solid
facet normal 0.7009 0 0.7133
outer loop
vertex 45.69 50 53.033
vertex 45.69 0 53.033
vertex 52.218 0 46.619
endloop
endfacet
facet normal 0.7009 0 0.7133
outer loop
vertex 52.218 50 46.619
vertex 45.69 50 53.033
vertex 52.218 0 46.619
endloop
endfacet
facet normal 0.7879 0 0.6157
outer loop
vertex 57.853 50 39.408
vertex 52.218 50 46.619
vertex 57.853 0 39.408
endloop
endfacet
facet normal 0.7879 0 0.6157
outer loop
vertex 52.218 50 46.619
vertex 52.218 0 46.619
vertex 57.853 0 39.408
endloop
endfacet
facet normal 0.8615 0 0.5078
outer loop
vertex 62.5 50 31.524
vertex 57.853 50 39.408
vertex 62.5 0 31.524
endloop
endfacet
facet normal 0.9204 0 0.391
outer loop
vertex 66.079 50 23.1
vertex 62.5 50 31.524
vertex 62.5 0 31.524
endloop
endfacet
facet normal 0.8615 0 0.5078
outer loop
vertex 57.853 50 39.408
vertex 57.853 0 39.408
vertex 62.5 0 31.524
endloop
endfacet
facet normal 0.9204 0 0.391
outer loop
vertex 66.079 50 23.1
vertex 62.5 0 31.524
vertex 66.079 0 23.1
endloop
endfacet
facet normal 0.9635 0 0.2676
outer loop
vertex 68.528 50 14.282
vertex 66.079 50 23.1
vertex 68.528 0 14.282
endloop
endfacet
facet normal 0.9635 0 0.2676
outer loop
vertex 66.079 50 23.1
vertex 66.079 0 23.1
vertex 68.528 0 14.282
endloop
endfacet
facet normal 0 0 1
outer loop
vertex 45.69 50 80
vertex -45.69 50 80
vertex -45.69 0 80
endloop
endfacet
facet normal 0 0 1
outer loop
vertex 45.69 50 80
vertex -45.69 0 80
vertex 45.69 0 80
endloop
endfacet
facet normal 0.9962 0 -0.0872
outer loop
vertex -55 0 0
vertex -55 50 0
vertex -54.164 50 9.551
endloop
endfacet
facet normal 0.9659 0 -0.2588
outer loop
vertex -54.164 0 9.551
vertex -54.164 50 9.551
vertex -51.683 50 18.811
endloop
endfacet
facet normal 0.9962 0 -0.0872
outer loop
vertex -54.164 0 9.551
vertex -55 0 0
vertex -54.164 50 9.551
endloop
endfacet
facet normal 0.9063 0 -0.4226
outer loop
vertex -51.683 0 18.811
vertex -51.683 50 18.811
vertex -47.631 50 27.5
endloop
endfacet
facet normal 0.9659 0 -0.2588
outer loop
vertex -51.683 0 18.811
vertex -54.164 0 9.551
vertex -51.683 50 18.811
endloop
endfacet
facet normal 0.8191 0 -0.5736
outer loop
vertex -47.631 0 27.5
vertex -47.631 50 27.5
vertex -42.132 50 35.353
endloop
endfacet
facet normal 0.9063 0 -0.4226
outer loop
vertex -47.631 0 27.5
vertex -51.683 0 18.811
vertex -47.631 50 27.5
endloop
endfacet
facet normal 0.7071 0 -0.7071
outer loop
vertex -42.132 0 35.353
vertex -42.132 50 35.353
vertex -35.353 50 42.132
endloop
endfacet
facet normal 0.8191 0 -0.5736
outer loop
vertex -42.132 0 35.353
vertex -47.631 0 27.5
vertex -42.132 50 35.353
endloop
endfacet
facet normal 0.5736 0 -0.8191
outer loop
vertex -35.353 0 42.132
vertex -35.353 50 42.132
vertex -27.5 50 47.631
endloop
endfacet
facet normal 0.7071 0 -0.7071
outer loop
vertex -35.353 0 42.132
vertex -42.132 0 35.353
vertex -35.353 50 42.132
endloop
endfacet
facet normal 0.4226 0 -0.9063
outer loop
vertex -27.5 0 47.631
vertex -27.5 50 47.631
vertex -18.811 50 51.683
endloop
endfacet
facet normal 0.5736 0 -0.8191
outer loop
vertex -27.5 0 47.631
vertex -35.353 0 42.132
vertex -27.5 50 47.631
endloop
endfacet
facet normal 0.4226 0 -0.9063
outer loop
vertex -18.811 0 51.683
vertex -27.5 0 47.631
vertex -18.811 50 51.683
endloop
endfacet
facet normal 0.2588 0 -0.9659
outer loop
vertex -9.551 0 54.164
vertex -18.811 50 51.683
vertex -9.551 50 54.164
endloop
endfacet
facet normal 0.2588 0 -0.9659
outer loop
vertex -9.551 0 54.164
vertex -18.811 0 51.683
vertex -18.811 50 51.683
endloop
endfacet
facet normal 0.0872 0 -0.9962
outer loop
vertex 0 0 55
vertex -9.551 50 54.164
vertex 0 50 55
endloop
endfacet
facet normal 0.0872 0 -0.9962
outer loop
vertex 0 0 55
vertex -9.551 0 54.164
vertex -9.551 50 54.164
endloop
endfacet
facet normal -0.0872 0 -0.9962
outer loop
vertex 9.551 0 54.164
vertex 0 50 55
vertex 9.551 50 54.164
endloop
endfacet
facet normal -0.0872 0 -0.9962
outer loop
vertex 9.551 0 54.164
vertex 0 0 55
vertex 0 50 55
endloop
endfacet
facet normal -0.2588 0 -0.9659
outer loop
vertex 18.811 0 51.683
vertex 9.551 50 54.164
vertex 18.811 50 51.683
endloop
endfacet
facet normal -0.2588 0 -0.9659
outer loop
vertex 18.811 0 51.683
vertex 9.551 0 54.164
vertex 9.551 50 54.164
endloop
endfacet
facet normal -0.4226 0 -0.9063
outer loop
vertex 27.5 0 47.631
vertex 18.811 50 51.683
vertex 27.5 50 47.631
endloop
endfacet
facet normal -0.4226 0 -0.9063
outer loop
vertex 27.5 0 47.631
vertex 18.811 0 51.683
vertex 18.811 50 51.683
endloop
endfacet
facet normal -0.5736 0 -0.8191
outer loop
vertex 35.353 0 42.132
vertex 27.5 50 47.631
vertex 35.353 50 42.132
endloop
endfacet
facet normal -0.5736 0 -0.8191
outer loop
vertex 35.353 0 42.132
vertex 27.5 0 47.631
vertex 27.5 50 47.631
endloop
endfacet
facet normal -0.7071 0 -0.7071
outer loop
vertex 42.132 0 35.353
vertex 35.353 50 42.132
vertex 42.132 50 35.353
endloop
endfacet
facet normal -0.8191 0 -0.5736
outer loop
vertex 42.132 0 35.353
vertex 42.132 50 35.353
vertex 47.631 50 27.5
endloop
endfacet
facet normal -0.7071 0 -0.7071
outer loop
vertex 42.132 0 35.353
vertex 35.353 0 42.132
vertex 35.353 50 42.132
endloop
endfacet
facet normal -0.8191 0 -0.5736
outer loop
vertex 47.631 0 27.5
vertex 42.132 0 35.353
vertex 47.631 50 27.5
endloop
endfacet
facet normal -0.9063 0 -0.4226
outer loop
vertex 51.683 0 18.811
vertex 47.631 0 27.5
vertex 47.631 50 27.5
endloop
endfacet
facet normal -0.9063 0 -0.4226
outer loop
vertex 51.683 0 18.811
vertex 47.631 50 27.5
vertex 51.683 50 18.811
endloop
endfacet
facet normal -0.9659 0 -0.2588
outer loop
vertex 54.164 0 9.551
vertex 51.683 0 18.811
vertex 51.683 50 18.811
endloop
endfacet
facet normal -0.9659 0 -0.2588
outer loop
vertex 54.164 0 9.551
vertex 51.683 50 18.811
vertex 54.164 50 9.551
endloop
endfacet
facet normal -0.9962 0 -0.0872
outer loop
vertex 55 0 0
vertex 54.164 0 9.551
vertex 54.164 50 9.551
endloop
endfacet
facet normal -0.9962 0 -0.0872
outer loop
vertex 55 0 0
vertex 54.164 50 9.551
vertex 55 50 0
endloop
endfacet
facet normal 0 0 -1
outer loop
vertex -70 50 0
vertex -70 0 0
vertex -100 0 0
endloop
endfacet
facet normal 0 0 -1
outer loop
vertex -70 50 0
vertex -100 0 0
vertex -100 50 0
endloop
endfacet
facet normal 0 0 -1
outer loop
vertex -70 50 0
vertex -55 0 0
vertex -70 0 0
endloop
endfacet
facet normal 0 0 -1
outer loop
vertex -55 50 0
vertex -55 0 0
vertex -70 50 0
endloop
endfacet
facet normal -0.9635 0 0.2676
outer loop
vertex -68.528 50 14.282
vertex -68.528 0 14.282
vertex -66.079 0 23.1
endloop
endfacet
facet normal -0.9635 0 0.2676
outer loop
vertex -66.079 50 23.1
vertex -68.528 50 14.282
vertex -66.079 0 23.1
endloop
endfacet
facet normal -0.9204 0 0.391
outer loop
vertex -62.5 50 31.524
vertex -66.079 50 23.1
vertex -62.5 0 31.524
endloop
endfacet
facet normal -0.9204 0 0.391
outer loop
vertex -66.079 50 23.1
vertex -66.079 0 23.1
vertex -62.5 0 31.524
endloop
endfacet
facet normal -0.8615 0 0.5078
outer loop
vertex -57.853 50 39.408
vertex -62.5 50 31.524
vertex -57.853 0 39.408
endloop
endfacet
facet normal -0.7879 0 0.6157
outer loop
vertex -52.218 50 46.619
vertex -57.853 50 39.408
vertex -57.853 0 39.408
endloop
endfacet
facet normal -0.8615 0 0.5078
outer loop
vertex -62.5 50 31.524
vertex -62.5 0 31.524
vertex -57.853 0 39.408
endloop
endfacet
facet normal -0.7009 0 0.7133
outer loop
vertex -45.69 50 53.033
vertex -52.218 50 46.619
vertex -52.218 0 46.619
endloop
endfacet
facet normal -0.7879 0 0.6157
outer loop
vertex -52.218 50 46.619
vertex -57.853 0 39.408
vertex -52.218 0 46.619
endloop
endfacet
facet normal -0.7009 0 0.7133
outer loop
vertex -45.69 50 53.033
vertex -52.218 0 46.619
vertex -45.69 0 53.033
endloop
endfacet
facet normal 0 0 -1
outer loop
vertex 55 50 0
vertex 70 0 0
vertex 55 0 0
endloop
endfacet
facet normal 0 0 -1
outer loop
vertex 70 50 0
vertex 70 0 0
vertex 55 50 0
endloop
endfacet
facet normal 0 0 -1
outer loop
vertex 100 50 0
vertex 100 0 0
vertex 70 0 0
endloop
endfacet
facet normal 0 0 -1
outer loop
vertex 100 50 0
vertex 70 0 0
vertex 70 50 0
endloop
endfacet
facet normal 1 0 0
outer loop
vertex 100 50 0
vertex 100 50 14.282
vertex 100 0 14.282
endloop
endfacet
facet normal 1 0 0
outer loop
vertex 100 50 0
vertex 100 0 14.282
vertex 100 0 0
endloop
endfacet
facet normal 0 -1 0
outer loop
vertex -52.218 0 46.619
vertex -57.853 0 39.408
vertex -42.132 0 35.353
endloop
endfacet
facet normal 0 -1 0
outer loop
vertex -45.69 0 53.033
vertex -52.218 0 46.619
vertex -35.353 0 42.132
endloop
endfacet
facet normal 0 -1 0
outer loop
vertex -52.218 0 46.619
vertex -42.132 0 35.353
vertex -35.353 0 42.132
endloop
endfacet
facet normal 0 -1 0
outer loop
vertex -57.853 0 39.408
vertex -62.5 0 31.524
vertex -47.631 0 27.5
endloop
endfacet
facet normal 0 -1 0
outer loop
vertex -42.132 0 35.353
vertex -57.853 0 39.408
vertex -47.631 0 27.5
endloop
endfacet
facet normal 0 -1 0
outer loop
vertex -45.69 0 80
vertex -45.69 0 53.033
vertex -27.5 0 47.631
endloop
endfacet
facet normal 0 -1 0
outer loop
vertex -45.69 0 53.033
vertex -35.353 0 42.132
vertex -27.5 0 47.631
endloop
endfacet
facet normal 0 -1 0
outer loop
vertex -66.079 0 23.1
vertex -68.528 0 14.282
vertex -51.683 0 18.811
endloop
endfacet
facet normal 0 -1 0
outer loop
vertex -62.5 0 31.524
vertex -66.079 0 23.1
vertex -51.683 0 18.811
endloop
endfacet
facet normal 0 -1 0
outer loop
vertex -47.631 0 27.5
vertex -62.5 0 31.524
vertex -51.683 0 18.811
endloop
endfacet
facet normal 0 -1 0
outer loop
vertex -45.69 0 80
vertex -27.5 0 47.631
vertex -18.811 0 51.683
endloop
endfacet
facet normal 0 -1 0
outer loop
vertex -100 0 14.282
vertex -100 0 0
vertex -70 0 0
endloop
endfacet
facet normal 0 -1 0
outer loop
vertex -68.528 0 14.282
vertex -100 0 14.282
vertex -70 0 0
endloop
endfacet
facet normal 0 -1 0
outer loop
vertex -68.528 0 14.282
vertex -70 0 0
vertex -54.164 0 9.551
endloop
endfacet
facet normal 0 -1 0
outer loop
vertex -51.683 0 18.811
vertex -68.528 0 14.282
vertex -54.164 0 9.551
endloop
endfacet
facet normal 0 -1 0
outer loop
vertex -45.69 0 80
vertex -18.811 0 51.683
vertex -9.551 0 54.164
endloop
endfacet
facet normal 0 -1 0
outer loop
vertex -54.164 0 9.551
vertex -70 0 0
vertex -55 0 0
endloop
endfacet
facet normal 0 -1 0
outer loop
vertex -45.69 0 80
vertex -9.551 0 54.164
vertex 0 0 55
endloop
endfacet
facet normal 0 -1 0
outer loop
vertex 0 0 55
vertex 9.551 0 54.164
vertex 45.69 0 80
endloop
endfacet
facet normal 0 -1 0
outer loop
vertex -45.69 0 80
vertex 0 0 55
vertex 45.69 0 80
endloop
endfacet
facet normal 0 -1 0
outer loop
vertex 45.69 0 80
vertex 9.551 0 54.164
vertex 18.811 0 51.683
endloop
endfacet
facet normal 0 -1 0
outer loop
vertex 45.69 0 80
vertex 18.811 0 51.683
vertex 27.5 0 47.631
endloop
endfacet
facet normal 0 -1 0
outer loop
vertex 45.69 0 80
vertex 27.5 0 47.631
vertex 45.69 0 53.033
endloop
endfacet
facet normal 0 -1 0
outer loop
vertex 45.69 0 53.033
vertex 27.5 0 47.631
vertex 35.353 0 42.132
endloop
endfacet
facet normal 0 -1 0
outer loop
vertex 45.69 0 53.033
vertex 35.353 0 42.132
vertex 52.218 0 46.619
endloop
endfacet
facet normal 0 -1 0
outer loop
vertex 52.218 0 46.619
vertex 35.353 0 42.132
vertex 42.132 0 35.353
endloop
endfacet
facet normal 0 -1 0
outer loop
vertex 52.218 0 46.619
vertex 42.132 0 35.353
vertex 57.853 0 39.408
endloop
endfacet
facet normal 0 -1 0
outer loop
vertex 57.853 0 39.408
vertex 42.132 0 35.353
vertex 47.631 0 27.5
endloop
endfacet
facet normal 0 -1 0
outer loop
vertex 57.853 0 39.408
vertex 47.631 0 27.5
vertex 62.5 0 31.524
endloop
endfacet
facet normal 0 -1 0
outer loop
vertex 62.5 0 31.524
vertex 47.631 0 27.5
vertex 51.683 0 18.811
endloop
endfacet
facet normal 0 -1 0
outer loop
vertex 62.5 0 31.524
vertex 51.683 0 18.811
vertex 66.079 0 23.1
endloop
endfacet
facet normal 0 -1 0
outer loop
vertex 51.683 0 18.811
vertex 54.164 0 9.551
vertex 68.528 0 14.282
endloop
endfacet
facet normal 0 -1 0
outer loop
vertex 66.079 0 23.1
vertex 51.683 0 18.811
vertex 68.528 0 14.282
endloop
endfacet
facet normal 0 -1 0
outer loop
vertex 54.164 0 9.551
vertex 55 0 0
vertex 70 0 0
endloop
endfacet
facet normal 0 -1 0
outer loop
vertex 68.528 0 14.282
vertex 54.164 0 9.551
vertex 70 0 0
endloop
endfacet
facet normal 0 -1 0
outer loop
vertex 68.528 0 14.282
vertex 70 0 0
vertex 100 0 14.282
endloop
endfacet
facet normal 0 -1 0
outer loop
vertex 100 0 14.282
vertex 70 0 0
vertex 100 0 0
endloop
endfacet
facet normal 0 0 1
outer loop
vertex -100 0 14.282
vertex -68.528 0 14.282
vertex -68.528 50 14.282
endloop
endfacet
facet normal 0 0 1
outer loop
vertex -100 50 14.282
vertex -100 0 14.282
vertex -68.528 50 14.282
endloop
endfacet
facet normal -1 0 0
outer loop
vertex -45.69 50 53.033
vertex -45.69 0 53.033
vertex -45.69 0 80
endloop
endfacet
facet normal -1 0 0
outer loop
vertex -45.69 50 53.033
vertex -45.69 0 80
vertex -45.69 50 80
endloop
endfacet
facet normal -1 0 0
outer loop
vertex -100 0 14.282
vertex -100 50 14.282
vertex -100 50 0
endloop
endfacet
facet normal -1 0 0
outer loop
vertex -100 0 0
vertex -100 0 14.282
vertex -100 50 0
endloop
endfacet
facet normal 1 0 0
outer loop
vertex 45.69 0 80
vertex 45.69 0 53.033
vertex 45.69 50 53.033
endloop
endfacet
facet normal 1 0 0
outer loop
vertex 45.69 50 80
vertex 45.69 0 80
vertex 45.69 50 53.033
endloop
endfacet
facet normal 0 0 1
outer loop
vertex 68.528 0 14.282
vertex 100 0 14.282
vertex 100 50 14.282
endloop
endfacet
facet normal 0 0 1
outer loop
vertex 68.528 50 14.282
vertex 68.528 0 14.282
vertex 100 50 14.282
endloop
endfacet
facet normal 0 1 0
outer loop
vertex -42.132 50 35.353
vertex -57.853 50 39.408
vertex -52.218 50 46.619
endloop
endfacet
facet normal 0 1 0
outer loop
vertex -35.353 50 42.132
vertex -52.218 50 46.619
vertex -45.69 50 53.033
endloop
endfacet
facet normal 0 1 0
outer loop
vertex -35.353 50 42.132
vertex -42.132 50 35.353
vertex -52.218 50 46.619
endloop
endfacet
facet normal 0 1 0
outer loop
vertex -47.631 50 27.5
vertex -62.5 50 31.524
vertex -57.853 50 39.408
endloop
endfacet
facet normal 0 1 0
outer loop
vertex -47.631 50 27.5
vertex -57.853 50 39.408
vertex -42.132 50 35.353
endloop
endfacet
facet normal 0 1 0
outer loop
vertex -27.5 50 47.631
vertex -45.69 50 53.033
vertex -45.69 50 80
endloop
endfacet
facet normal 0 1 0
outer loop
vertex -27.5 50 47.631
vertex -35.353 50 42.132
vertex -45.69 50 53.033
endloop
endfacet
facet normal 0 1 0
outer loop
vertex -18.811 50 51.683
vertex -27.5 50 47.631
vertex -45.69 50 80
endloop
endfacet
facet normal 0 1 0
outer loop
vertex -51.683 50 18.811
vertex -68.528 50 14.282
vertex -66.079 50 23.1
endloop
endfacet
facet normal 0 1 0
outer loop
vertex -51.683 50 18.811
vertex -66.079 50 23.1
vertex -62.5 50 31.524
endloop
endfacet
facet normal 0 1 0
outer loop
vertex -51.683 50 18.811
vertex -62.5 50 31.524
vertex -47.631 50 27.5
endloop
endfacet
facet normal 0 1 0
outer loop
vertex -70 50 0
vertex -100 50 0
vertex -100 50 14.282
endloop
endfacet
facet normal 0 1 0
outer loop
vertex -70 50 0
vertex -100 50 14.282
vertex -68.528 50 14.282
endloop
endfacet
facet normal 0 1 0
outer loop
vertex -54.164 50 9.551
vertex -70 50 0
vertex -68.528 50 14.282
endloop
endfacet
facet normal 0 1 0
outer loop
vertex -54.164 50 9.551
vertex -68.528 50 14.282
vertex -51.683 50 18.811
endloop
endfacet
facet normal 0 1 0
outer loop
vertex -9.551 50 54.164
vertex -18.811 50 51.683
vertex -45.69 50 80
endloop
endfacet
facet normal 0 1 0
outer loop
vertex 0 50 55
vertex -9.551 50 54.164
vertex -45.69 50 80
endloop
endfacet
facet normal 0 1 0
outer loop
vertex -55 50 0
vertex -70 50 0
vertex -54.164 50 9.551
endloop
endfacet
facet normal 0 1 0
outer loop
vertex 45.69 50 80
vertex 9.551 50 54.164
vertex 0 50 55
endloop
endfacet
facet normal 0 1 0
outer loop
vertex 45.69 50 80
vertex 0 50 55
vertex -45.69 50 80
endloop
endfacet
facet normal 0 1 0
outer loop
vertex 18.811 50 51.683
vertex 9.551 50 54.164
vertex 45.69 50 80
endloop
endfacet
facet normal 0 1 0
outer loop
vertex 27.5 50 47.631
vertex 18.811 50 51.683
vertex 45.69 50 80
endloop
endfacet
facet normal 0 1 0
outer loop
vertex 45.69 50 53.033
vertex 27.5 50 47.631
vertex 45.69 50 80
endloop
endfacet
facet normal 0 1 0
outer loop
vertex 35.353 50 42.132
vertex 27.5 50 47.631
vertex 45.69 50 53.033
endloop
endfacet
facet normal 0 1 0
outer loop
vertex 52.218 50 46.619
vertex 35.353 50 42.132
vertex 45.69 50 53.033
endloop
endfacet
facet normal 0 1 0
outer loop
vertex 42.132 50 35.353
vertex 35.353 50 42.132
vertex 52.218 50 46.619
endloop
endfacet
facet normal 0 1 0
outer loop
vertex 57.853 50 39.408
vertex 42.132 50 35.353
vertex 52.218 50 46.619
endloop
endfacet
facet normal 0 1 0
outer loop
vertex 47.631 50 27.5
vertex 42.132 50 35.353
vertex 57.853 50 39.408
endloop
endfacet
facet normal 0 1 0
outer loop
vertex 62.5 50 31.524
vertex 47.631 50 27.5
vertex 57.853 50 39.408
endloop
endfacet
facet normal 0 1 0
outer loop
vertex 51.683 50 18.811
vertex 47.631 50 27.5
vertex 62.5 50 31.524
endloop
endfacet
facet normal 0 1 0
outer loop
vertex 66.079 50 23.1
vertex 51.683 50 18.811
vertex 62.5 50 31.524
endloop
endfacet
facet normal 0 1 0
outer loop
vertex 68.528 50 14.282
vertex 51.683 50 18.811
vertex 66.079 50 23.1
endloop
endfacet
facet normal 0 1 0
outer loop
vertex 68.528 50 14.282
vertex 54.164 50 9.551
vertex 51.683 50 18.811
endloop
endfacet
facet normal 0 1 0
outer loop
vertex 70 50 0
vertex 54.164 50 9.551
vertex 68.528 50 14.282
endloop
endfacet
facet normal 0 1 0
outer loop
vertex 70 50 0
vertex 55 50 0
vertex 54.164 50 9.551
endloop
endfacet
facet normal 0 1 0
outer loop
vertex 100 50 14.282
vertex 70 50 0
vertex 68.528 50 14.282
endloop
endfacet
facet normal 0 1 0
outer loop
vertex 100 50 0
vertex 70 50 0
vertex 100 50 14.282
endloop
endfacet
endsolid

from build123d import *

# Parameters (mm, degrees)
BOSS_EXTRUDE1_DEPTH = 50
SKETCH3_W           = 14.282150027
SKETCH3_H           = 50
BOSS_EXTRUDE2_DEPTH = 100
CUT_EXTRUDE3_START  = -200
SKETCH10_R          = 55
CUT_EXTRUDE3_DEPTH  = 200
SKETCH11_W          = 91.379110146
SKETCH11_H          = 50
BOSS_EXTRUDE4_DEPTH = 80
CUT_EXTRUDE4_START  = -200
SKETCH12_R          = 55
CUT_EXTRUDE4_DEPTH  = 200


with BuildPart() as part:
    # Sketch1 → Boss-Extrude1 (new body)
    with BuildSketch(Plane(origin=(0, 0, 0), x_dir=(1, 0, 0), z_dir=(0, 1, 0))):
        with BuildLine():
            ThreePointArc((-70, 0), (0, -70), (70, 0))
            Line((70, 0), (55, 0))
            ThreePointArc((55, 0), (0, -55), (-55, 0))
            Line((-55, 0), (-70, 0))
        make_face()
    extrude(amount=BOSS_EXTRUDE1_DEPTH)

    # Sketch3 → Boss-Extrude2 (add, symmetric)
    with BuildSketch(Plane(origin=(0, 0, 0), x_dir=(0, 0, -1), z_dir=(1, 0, 0))):
        with Locations((-7.141075014, 25)):
            Rectangle(SKETCH3_W, SKETCH3_H)
    extrude(amount=BOSS_EXTRUDE2_DEPTH, both=True)

    # Sketch10 → Cut-Extrude3 (cut)
    with BuildSketch(Plane(origin=(0, 50, 0), x_dir=(1, 0, 0), z_dir=(0, 1, 0)).offset(CUT_EXTRUDE3_START)):
        Circle(SKETCH10_R)
    extrude(amount=CUT_EXTRUDE3_DEPTH, mode=Mode.SUBTRACT)

    # Sketch11 → Boss-Extrude4 (add)
    with BuildSketch(Plane.XY):
        with Locations((0, 25)):
            Rectangle(SKETCH11_W, SKETCH11_H)
    extrude(amount=BOSS_EXTRUDE4_DEPTH)

    # Sketch12 → Cut-Extrude4 (cut)
    with BuildSketch(Plane(origin=(0, 50, 0), x_dir=(1, 0, 0), z_dir=(0, 1, 0)).offset(CUT_EXTRUDE4_START)):
        Circle(SKETCH12_R)
    extrude(amount=CUT_EXTRUDE4_DEPTH, mode=Mode.SUBTRACT)


solid = part.part
